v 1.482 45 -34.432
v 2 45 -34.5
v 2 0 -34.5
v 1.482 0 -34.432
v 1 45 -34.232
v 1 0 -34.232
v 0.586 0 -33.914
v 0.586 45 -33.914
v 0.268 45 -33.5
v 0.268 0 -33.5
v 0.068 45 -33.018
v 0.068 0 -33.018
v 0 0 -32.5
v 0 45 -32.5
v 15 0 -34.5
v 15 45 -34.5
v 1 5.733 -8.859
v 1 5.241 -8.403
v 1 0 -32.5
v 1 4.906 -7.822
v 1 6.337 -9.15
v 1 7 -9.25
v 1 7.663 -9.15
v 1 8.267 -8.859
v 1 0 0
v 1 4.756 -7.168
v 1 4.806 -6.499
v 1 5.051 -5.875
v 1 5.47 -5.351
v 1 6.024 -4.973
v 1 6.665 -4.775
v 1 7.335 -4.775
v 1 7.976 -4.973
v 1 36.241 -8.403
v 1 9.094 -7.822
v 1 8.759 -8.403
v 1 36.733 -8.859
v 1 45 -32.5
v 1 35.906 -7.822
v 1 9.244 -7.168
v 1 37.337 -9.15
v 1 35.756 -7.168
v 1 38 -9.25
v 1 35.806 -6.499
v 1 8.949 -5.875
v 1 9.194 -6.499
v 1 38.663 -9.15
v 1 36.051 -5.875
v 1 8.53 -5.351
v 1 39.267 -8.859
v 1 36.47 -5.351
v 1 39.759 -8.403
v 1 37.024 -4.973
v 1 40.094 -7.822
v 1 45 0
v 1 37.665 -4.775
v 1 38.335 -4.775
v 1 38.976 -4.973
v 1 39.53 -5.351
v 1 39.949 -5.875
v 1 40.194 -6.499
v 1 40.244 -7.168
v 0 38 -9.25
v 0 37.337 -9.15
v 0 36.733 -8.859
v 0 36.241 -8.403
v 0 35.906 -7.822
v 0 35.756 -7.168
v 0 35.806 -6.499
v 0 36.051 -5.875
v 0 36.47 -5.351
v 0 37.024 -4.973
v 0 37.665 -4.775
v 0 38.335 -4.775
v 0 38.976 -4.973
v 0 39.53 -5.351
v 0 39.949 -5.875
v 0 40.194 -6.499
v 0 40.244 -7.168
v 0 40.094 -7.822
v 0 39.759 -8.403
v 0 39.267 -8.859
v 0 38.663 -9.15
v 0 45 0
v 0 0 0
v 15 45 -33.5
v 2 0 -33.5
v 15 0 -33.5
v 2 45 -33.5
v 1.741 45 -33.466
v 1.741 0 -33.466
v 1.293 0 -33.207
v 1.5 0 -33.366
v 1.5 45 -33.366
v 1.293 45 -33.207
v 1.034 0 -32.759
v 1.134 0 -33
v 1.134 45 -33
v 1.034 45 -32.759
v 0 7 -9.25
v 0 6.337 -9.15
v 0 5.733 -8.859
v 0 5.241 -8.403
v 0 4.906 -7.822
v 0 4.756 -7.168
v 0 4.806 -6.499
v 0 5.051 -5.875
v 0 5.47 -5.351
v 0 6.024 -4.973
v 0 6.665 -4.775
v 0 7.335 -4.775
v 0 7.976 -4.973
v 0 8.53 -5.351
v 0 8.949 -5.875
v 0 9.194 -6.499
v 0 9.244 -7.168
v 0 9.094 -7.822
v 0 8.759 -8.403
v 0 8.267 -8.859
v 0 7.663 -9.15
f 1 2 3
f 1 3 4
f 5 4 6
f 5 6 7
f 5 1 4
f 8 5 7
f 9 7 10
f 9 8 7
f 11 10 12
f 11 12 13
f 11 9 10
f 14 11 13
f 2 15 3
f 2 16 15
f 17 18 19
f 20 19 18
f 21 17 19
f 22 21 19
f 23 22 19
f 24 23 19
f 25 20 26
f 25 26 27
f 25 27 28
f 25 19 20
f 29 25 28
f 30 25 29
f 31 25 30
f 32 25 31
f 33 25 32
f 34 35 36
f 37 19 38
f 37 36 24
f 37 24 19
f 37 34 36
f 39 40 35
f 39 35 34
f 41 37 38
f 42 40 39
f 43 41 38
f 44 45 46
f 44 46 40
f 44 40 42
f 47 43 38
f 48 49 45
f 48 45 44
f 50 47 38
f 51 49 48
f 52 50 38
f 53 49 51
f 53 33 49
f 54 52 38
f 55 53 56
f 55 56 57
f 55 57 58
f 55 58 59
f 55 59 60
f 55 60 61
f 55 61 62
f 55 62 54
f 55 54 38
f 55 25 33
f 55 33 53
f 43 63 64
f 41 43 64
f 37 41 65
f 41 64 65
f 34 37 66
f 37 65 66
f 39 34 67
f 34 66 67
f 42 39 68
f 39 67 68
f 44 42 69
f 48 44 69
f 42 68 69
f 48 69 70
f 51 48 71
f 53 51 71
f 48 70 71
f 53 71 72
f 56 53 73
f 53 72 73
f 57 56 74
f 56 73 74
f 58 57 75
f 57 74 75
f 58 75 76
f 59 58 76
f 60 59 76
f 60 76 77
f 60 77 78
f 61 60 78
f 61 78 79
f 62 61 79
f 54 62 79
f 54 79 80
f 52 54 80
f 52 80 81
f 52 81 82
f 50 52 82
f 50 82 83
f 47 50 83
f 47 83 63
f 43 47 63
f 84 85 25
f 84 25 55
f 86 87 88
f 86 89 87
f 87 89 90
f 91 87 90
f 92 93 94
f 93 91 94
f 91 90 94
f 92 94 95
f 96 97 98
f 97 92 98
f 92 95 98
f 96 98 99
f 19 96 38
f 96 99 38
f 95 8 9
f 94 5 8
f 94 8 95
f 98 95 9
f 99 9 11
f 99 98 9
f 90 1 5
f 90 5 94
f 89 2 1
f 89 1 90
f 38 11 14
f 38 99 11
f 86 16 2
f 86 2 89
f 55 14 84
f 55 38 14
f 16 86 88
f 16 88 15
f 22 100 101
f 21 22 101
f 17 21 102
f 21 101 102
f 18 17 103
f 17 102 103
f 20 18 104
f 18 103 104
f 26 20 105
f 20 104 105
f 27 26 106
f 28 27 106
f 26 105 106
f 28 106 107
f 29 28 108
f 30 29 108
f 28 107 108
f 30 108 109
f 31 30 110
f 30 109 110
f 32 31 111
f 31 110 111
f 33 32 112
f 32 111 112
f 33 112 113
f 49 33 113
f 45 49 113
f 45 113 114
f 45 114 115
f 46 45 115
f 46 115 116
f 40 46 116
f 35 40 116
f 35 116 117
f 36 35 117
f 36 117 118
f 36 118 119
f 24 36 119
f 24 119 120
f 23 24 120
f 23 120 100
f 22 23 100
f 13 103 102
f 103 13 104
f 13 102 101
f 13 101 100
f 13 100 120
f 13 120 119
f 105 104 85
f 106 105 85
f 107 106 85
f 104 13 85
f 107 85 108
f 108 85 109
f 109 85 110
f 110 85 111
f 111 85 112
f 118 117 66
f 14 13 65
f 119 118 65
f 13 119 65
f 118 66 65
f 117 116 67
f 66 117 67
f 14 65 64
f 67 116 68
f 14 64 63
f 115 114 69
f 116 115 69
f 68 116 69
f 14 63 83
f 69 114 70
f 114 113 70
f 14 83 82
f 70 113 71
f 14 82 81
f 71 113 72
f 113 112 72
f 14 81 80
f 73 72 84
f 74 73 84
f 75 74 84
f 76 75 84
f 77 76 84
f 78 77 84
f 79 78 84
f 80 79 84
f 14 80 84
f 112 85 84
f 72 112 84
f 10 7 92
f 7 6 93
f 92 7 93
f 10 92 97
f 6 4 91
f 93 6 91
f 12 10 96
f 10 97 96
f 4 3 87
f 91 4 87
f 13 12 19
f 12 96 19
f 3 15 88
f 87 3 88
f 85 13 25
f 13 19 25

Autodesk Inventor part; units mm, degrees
ref_plane "YZ Plane" through (0, 0, 0) normal (1, 0, 0) x (0, 1, 0)
ref_plane "XZ Plane" through (0, 0, 0) normal (0, 1, 0) x (-1, 0, 0)
ref_plane "XY Plane" through (0, 0, 0) normal (0, 0, 1) x (1, 0, 0)
sketch "Sketch1" plane through (0, 0, 0) normal (1, 0, 0) x (0, 1, 0)
  line L0 (0, 0) -> (45, 0)
  line L1 (45, 0) -> (45, -34.5)
  line L2 (45, -34.5) -> (0, -34.5)
  line L3 (0, -34.5) -> (0, 0)
  dimension "d0" = 45
  dimension "d1" = 34.5
extrude "Plate1" add sketch "Sketch1" along normal blind 1
sketch "Sketch2" plane through (0, 45, -33.5) normal (0, 0, -1) x (-1, 0, 0)
  line L0 (0, -45) -> (0, 0)
  line L1 (0, 0) -> (-15, 0)
  line L2 (-15, 0) -> (-15, -45)
  line L3 (-15, -45) -> (0, -45)
edge flange "Flange1" height 15 angle 90 thickness 1 bend radius 1 thickness toward (0, 0, -1) relief tear relief width 1 relief depth 0.5 edges at (1, 22.5, -34.5) wall of the first edge with corners at (0, 0, -33.5) (0, 45, -33.5) (15, 45, -33.5) (15, 0, -33.5)
bend "Bend1"
corner "Corner1"
sketch "Sketch3" plane through (1, 0, 0) normal (1, 0, 0) x (0, 0, -1)
  line L0 (0, 45) -> (32.5, 45) projected
  line L1 (0, 0) -> (0, 45) projected
  line L2 (32.5, 0) -> (0, 0) projected
  point P0 (7, 38)
  point P1 (7, 7)
  dimension "d13" = 7
  dimension "d14" = 7
  dimension "d15" = 7
hole "Hole1" at (1, 38, -7) at (1, 7, -7) direction (-1, 0, 0) diameter 4.5 end through all
equation "\"d15\" = d13"
equation "\"d21\" = Thickness"
equation "\"d2\" = Thickness"
equation "\"d3\" = BendReliefWidth"
equation "\"d4\" = BendReliefDepth"
equation "\"d5\" = MinimumRemnant"
equation "\"d6\" = TransitionRadius"
equation "\"d9\" = BendRadius"
equation "\"d10\" = CornerReliefSize"
equation "\"d11\" = GapSize"
equation "\"d12\" = JacobiRadiusSize"
equation "\"BendRadius\" = Thickness"
equation "\"BendReliefWidth\" = Thickness"
equation "\"BendReliefDepth\" = 0.5 * Thickness"
equation "\"CornerReliefSize\" = 4 * Thickness"
equation "\"MinimumRemnant\" = 2 * Thickness"
equation "\"TransitionRadius\" = BendRadius"
equation "\"JacobiRadiusSize\" = BendRadius"
equation "\"GapSize\" = Thickness"
equation "\"Thickness\" = 1"
properties part number "Plate A connector box-iv stand" material "Steel, Carbon"
